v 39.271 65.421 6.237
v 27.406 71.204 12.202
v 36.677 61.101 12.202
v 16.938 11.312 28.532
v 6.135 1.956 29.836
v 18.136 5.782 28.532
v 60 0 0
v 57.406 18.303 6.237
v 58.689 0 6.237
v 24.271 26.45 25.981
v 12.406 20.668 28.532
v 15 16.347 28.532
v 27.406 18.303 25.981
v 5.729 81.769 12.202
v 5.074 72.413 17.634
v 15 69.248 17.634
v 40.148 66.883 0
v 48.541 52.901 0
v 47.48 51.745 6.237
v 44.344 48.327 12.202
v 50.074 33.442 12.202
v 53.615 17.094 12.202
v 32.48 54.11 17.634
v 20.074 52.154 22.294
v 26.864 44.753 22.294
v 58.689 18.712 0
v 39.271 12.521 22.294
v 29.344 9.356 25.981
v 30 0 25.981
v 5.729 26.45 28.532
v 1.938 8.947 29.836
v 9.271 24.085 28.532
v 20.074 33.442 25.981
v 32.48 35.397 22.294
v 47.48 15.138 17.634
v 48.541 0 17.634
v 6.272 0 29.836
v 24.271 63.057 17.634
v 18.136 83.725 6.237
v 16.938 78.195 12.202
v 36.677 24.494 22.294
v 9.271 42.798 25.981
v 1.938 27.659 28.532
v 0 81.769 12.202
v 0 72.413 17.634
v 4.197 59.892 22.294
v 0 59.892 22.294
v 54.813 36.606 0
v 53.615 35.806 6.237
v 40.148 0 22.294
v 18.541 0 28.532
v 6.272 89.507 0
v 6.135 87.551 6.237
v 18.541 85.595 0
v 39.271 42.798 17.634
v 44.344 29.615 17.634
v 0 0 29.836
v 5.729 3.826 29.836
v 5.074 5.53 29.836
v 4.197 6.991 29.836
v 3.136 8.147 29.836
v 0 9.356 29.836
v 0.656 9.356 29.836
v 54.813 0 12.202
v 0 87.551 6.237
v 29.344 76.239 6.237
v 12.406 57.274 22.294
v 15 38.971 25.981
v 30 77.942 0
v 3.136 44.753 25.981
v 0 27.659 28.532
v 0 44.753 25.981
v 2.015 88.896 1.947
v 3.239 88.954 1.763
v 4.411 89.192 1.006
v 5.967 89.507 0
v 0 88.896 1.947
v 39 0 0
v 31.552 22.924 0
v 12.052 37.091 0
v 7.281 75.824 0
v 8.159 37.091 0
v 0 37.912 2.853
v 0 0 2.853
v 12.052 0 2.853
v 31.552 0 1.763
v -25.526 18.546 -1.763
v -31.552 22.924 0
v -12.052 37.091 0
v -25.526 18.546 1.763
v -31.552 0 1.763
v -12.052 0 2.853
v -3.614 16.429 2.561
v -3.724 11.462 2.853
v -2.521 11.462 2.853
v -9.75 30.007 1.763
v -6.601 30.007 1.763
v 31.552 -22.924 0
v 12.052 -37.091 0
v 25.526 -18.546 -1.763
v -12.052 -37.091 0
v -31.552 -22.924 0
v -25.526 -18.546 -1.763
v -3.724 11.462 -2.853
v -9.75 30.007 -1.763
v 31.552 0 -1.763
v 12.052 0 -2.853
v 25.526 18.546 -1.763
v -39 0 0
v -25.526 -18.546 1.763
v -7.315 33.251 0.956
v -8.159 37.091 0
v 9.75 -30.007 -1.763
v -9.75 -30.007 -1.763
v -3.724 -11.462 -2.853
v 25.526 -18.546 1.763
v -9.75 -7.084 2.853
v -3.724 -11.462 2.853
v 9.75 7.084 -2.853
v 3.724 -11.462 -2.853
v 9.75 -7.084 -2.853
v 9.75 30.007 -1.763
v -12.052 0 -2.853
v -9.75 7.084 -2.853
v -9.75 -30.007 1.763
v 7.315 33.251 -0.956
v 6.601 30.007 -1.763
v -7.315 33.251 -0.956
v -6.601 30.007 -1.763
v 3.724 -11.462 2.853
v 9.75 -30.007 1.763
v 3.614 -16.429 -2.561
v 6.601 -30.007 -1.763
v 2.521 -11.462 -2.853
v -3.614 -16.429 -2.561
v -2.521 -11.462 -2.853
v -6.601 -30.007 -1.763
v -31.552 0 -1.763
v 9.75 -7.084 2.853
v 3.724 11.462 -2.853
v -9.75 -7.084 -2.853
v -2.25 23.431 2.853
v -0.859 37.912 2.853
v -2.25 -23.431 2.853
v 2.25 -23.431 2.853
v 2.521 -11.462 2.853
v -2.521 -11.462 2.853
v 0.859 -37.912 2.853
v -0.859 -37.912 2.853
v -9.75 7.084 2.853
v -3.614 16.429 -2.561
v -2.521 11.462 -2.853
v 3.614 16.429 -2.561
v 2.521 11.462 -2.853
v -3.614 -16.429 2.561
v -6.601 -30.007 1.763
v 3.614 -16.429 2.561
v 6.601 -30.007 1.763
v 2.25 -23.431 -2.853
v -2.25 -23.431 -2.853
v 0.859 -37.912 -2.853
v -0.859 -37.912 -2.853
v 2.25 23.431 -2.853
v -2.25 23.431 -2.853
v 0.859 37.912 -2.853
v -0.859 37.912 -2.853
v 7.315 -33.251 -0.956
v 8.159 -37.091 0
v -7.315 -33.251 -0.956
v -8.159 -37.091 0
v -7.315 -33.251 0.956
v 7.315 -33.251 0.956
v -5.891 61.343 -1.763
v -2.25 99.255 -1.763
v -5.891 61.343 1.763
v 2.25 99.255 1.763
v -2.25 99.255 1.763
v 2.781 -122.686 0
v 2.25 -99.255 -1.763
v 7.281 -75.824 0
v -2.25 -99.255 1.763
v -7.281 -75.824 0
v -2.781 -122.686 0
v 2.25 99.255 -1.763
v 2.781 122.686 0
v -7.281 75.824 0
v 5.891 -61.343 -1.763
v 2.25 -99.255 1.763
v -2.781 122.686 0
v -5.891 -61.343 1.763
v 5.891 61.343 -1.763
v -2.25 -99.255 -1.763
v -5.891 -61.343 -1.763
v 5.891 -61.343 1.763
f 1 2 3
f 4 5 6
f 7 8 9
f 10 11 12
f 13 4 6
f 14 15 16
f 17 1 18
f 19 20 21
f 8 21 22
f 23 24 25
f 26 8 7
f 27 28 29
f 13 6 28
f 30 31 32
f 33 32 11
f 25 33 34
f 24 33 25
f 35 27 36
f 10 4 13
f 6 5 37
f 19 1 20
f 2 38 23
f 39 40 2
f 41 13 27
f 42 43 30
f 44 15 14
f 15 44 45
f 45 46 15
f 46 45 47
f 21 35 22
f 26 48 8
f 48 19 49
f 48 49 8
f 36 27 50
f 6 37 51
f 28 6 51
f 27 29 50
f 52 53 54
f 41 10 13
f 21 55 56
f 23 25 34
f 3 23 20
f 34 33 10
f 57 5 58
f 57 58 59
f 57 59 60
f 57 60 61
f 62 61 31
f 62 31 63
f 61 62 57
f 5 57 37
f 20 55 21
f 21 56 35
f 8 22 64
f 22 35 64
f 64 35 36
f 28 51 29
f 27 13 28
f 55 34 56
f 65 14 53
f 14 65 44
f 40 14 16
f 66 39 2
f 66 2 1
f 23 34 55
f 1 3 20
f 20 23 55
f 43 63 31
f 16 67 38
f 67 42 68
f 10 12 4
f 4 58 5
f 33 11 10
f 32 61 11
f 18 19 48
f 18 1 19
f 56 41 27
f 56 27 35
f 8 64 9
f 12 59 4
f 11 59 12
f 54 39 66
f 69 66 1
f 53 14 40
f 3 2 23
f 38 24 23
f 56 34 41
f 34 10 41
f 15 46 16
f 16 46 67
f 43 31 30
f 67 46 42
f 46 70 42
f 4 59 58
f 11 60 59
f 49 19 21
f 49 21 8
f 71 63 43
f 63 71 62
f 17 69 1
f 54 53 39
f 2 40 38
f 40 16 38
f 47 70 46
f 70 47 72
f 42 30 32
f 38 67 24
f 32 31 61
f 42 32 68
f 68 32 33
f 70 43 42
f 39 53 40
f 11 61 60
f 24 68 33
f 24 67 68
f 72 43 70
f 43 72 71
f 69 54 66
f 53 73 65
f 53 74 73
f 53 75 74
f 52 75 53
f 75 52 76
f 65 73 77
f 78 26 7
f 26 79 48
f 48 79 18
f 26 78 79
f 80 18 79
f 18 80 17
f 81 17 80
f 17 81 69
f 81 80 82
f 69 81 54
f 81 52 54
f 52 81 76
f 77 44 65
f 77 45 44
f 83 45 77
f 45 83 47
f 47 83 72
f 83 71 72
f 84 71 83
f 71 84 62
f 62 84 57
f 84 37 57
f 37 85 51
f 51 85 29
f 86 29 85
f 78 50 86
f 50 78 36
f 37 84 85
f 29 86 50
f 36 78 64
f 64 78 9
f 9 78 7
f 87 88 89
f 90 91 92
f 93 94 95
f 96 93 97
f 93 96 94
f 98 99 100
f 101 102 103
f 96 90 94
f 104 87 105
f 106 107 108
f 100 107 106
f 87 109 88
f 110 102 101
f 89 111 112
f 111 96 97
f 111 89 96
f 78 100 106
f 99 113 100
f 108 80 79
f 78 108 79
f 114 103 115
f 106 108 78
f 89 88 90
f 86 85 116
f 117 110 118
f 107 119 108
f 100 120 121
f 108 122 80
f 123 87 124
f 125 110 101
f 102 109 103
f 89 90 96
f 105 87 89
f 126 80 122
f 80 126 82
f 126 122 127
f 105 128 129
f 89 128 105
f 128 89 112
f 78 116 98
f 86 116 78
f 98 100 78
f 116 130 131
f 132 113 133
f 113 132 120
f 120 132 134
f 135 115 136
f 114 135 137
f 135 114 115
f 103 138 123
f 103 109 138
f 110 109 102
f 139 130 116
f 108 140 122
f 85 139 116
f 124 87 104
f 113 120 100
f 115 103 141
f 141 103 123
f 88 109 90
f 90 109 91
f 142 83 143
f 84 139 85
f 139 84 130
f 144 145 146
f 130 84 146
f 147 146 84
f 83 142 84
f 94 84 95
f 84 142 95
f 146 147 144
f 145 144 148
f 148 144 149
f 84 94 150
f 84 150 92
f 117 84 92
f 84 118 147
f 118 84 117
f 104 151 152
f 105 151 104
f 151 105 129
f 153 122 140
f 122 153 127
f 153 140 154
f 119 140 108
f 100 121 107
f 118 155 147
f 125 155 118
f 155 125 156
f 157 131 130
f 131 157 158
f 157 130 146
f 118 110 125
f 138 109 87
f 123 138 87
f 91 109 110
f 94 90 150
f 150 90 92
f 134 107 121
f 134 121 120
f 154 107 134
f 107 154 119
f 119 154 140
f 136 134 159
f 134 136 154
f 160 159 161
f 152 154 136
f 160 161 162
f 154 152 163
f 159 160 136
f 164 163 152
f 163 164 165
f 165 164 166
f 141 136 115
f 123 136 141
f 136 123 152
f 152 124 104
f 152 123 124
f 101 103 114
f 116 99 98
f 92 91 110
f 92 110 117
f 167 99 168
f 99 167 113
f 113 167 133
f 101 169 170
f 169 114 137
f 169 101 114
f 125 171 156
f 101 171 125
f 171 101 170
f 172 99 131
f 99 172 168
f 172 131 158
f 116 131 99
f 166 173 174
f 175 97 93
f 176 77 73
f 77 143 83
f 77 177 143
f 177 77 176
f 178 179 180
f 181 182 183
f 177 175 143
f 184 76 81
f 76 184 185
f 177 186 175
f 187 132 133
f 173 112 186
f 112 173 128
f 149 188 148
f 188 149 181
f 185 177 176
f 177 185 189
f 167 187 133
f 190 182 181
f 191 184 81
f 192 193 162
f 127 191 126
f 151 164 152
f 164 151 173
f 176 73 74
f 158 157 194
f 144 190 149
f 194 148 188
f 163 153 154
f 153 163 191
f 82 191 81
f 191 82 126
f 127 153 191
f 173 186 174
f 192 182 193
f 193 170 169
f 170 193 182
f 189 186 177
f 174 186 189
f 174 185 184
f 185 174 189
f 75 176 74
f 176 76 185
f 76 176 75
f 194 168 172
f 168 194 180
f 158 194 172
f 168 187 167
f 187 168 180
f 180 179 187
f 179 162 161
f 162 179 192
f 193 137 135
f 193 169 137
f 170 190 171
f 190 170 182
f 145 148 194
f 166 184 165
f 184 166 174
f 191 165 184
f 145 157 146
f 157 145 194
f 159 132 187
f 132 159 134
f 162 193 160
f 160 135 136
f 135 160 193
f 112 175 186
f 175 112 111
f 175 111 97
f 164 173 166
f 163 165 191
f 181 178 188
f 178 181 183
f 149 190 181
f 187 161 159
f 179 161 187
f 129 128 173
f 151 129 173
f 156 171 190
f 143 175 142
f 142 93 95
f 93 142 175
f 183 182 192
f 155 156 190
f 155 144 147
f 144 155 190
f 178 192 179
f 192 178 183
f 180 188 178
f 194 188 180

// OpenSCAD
scale([2,3,1])intersection()
{
    sphere(30);
    cube(30);
}

%cube(45);

scale([13,13,1])sphere(3);

scale([3,,43])sphere(3);
